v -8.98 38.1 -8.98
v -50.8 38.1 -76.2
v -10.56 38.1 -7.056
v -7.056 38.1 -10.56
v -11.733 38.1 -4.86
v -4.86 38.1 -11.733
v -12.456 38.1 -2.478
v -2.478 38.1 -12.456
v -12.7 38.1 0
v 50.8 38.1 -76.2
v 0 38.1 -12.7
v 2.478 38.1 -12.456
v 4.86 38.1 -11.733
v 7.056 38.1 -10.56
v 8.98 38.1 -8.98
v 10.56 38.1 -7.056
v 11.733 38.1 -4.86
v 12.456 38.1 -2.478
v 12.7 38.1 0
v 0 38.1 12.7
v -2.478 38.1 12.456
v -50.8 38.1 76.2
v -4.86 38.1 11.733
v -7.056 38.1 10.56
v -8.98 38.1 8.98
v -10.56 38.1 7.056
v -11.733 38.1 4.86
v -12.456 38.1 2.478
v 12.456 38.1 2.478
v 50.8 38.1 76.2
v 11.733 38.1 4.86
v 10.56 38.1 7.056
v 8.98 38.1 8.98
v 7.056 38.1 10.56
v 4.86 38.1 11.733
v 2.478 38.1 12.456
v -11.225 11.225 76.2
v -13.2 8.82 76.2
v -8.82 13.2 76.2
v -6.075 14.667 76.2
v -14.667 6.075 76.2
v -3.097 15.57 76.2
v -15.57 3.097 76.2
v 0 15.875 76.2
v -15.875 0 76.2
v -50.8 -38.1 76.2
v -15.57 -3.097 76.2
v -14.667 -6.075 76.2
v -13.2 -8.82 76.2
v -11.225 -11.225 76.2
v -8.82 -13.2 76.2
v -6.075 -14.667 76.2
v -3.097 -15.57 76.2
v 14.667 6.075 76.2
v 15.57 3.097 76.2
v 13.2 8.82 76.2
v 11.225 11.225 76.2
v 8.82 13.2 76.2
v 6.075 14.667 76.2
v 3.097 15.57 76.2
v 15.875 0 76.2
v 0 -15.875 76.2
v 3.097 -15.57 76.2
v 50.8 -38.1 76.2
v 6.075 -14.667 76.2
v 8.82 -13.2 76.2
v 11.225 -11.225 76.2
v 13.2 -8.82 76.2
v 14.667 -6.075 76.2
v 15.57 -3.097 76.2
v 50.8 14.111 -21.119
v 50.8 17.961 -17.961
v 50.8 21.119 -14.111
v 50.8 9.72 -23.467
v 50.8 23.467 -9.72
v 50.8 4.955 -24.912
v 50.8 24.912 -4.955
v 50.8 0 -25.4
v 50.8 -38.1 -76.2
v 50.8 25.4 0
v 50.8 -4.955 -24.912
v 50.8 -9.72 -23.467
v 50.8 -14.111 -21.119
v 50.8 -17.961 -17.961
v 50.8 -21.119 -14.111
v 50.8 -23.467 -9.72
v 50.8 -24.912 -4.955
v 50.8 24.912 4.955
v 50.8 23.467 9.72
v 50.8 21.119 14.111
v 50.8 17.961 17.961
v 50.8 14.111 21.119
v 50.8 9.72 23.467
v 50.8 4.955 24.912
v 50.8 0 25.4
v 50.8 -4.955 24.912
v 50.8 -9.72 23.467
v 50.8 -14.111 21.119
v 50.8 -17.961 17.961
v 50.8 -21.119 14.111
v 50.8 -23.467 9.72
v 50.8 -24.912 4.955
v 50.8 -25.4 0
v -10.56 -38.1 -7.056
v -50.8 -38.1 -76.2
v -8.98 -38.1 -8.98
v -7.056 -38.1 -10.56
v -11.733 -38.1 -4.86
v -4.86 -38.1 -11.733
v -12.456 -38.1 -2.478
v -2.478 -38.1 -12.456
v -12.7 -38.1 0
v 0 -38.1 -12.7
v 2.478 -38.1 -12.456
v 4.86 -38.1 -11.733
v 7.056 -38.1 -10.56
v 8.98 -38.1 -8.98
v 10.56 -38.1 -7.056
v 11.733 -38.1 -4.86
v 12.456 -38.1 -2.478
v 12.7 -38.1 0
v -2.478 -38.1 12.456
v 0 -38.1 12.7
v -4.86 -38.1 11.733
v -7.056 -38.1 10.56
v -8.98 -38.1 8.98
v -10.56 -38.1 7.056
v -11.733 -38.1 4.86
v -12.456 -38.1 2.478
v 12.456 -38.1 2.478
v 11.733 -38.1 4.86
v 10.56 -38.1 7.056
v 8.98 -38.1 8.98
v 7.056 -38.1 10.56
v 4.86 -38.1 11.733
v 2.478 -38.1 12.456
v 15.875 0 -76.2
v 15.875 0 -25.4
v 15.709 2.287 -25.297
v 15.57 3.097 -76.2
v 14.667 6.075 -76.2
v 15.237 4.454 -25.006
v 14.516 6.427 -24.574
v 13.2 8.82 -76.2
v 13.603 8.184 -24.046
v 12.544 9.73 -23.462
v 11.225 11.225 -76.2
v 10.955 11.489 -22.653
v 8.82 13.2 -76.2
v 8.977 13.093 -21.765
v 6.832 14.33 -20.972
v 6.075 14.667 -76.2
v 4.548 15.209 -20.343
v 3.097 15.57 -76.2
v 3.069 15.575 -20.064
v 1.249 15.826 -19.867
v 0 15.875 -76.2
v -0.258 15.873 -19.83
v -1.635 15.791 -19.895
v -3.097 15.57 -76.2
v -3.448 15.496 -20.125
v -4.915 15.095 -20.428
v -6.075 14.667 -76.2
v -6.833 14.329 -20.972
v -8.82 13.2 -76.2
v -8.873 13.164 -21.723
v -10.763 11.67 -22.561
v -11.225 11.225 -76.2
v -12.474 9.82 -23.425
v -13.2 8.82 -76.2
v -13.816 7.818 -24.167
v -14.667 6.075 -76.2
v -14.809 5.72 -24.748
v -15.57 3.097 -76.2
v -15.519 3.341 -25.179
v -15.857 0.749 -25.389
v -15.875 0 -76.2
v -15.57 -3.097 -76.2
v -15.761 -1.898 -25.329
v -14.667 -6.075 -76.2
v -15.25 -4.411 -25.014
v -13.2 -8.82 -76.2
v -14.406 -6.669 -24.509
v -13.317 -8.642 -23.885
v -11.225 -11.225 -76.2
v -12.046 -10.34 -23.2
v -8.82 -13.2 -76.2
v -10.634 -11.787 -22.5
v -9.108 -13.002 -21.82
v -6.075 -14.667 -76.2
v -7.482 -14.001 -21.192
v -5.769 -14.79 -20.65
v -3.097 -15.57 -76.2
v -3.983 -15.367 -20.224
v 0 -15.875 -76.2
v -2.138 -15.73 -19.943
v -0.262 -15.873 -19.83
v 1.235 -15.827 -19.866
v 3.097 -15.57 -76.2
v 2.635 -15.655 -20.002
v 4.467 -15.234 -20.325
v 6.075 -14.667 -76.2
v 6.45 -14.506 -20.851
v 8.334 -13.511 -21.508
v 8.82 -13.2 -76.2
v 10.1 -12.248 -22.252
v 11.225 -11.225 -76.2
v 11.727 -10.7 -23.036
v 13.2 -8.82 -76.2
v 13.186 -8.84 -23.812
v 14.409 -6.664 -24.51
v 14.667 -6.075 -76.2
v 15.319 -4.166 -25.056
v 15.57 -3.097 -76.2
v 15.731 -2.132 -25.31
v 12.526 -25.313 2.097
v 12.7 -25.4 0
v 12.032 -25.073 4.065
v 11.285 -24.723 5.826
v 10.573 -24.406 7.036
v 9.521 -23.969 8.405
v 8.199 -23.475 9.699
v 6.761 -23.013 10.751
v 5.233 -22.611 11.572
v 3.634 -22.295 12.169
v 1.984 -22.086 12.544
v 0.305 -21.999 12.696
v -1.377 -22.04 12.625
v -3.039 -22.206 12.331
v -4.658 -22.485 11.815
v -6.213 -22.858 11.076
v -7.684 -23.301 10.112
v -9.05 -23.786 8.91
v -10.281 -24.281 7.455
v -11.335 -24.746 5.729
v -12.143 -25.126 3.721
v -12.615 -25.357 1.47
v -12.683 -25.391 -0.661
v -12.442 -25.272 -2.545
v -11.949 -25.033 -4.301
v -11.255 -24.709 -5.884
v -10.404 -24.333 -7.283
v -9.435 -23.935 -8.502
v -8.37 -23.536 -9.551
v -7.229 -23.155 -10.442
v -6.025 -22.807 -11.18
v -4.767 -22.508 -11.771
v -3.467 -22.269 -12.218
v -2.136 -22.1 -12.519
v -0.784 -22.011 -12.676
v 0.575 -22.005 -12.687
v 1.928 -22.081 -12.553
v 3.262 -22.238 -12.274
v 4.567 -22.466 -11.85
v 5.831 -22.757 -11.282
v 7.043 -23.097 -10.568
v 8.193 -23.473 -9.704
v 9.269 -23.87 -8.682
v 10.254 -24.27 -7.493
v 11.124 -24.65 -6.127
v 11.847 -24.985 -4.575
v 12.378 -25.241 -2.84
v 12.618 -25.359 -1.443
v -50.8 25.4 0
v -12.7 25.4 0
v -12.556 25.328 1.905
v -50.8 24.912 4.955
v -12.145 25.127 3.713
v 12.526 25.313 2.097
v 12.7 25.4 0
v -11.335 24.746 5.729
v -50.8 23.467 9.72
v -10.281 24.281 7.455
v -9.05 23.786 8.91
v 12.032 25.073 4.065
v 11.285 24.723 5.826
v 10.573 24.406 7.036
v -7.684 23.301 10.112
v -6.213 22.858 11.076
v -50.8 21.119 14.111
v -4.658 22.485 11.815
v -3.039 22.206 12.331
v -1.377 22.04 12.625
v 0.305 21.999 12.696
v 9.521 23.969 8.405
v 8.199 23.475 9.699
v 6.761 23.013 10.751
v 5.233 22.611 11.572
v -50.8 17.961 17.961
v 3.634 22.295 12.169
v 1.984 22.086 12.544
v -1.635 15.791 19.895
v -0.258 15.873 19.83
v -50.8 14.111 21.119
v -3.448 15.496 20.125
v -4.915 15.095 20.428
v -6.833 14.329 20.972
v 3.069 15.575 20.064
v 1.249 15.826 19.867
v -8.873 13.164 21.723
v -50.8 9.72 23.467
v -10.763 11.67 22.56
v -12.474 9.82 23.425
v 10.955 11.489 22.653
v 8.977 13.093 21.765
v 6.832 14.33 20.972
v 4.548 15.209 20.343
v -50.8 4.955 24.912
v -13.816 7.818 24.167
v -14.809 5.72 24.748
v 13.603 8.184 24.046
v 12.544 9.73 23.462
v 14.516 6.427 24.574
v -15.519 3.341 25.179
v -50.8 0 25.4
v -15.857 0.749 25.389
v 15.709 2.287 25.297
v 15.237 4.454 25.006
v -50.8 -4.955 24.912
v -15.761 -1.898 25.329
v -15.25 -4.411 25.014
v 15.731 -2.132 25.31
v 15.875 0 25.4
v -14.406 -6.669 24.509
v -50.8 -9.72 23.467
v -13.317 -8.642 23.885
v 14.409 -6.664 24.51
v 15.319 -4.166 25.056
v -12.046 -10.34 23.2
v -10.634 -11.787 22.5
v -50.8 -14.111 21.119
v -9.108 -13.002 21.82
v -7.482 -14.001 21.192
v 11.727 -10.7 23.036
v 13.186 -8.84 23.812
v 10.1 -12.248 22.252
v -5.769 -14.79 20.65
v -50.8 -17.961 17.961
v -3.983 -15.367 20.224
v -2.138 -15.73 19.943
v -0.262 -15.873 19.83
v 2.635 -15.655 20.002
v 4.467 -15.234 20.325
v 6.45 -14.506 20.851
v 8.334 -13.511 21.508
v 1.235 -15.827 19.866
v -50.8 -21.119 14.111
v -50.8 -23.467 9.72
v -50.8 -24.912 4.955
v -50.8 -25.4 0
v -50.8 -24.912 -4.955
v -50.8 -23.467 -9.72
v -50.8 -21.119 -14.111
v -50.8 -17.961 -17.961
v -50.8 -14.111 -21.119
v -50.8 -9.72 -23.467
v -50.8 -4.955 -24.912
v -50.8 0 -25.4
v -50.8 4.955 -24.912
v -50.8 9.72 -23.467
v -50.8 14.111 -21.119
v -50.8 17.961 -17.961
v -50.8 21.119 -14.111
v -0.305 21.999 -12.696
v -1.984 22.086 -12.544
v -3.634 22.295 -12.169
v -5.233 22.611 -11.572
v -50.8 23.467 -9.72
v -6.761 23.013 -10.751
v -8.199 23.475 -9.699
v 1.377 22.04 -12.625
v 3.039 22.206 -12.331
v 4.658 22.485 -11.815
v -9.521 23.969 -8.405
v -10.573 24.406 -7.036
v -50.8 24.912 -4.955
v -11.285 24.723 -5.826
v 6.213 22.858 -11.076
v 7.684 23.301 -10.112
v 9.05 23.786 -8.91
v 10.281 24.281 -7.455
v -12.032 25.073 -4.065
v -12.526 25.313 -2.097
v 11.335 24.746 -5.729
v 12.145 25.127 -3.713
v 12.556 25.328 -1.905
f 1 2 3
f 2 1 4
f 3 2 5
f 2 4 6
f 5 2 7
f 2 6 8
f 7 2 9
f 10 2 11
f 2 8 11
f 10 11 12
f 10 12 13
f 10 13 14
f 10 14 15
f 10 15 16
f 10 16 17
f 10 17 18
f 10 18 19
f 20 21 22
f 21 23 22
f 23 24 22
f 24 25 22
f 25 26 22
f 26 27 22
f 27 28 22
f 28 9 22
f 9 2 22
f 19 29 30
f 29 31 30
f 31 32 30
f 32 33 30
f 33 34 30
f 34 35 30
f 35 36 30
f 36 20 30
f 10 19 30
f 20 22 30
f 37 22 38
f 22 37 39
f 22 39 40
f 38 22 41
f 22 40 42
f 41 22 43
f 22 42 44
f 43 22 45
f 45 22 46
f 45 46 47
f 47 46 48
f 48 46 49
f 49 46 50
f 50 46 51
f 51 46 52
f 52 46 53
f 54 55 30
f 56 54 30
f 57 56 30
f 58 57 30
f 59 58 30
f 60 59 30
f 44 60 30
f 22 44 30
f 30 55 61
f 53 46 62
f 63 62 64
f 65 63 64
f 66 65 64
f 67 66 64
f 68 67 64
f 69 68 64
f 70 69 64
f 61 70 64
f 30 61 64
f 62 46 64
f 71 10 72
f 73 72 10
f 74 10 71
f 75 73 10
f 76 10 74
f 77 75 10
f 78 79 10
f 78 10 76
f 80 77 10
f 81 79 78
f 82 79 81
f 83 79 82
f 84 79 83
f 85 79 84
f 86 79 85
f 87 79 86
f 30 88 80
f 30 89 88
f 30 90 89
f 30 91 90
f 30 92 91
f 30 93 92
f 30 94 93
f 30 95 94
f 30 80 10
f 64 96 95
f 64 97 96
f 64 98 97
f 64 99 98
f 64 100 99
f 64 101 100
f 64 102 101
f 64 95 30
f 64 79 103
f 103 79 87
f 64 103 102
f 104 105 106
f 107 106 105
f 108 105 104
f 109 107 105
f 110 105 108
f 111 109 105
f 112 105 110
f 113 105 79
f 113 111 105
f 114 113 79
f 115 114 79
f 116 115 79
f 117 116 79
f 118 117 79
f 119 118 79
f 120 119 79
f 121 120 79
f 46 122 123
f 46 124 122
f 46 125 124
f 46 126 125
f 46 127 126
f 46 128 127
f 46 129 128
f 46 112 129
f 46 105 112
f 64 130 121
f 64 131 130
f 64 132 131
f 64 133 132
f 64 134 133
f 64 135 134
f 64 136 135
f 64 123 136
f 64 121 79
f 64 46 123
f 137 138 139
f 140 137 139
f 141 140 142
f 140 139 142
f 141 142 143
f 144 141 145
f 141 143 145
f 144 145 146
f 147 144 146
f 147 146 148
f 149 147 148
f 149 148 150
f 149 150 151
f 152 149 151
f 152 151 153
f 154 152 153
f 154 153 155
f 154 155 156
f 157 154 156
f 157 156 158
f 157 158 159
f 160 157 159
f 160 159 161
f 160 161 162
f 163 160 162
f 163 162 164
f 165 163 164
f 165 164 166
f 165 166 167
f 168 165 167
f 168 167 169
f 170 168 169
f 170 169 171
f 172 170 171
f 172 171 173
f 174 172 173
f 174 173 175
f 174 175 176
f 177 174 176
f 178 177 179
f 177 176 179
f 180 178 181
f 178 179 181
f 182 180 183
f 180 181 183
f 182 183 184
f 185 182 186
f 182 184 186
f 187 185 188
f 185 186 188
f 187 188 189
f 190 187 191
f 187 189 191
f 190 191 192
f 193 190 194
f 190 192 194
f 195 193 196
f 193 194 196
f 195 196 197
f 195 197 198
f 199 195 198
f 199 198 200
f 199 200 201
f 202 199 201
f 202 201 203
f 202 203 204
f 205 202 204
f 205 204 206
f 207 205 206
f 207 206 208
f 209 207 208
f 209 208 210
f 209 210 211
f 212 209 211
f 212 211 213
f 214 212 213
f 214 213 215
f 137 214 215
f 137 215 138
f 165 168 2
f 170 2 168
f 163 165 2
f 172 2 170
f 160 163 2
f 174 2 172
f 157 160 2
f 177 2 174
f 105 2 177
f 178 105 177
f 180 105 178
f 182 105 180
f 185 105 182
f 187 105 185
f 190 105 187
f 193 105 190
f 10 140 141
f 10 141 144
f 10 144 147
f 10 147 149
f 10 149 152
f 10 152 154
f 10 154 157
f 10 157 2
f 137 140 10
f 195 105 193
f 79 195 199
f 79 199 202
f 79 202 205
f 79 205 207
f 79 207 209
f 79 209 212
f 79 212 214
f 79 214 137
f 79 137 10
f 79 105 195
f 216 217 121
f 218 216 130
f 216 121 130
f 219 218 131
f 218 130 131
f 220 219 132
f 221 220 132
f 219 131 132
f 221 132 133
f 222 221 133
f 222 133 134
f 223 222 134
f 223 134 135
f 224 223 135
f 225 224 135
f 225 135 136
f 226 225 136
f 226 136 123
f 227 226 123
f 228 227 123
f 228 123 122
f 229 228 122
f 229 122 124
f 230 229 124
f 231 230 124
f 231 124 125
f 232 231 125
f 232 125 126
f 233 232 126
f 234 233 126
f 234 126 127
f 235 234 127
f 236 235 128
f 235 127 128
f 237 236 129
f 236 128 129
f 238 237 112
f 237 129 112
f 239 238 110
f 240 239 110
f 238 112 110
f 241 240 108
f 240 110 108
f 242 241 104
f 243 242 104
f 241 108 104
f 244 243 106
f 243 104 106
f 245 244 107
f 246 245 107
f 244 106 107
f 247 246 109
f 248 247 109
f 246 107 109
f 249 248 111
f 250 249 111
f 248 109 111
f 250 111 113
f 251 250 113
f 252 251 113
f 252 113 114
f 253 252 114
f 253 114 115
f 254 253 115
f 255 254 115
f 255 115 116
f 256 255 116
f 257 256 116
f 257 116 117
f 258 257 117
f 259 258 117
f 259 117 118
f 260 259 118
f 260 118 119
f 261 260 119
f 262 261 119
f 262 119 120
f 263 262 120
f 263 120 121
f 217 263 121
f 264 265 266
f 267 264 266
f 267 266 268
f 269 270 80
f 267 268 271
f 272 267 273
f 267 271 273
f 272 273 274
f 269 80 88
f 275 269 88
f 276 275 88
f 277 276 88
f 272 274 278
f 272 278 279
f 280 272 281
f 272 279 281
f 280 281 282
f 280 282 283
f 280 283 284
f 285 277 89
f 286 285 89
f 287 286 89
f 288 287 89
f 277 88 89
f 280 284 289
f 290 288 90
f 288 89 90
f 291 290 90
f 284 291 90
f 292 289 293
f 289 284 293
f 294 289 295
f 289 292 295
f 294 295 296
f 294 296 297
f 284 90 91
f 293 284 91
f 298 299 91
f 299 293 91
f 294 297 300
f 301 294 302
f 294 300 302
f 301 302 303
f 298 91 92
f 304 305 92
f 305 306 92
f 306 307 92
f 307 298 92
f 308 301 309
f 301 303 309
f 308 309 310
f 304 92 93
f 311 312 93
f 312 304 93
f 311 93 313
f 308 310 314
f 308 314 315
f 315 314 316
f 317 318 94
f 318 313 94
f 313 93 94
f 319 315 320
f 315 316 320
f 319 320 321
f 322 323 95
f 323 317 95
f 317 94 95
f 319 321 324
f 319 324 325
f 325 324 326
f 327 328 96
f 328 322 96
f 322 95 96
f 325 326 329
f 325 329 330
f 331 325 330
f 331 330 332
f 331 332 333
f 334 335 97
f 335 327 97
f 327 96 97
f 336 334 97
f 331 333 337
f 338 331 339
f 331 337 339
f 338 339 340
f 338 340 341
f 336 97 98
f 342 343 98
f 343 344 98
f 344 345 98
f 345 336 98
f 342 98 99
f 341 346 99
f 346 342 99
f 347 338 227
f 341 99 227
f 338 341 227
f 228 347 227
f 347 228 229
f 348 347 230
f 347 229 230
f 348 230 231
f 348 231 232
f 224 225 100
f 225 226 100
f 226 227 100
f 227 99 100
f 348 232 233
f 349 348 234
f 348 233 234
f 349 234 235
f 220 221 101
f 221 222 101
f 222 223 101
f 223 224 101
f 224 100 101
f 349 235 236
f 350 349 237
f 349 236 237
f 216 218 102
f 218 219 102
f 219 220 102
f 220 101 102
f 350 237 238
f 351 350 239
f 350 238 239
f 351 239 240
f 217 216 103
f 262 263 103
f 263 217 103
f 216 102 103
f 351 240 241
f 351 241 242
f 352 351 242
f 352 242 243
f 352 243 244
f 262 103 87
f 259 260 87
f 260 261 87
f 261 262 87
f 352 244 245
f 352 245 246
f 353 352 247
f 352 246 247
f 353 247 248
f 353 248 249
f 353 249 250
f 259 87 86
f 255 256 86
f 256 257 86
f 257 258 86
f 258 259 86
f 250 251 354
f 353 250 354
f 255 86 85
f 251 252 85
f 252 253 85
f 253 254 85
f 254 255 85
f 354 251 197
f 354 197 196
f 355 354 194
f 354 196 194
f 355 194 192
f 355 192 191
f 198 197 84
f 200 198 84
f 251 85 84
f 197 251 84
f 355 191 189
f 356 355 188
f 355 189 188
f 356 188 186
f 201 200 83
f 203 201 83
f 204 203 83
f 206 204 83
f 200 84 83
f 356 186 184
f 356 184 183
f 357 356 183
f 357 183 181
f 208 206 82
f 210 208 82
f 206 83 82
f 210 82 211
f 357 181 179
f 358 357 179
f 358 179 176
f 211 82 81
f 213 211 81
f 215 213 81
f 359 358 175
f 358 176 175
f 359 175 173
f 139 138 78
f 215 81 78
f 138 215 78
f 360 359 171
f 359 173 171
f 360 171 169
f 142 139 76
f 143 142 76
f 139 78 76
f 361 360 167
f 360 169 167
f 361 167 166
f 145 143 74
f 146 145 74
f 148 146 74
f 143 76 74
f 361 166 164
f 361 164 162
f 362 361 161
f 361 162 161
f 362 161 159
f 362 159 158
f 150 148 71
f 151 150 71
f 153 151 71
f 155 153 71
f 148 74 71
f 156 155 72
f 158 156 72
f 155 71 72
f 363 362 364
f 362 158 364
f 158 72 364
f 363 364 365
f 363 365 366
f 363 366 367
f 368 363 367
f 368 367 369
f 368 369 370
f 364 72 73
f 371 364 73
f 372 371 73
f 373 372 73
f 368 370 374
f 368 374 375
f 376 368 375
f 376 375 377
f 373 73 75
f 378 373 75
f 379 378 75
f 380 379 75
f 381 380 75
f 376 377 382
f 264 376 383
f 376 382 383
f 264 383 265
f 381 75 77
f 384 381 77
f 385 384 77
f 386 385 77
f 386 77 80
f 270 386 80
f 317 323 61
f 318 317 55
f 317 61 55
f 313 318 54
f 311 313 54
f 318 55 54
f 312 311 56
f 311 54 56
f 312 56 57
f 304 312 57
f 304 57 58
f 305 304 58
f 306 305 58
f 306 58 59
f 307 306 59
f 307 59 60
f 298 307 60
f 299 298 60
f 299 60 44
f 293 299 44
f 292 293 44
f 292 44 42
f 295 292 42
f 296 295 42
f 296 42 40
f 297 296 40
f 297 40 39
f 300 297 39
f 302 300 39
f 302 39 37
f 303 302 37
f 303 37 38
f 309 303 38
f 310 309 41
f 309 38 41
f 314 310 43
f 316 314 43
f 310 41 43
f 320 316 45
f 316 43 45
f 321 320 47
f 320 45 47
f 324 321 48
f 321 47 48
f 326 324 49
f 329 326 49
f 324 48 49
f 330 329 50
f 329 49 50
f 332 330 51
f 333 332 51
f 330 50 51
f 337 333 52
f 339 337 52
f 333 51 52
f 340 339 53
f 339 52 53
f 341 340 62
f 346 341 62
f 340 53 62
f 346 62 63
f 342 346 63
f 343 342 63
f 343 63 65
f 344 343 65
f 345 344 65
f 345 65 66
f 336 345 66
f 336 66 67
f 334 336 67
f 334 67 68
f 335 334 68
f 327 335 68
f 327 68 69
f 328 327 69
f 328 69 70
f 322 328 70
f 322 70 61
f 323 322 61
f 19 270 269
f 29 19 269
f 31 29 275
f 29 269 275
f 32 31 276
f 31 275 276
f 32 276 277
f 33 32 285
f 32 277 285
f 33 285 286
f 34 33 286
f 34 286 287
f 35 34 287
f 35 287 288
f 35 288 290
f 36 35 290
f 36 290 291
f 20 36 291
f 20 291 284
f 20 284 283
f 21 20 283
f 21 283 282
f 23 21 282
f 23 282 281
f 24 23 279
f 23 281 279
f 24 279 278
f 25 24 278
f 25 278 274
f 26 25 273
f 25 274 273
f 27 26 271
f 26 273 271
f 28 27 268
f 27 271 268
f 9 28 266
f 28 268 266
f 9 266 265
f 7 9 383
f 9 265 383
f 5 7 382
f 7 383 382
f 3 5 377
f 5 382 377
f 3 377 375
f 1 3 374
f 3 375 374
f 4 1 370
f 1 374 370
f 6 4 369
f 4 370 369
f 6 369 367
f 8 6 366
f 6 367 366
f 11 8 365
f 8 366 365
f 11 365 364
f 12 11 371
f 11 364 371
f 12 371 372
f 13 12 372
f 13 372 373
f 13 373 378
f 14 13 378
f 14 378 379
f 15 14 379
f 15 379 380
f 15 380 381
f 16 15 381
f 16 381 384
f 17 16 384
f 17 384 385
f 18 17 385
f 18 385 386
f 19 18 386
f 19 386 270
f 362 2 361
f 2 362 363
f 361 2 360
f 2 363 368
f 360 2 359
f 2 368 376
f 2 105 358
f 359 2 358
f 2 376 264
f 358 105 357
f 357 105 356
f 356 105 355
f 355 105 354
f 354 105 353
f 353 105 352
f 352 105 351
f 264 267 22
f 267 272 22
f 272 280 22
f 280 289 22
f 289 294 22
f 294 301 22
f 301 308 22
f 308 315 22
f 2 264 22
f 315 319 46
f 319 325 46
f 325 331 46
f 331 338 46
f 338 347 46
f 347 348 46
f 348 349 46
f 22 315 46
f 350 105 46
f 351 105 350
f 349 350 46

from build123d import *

# Parameters (mm, degrees)
F0_W     = 101.6
F0_H     = 152.4
F1_DEPTH = 38.1
F2_R     = 12.7
F3_DEPTH = 76.201
F4_R     = 25.4
F5_DEPTH = 101.601
F6_R     = 15.875
F7_DEPTH = 152.401


with BuildPart() as f1:
    # F0 (on Front) → F1 (new body, symmetric)
    with BuildSketch(Plane.XZ):
        Rectangle(F0_W, F0_H)
    extrude(amount=F1_DEPTH, both=True)

    # F2 (on face) → F3 (cut, through all)
    with BuildSketch(Plane.XZ.offset(38.1)):
        Circle(F2_R)
    extrude(amount=-F3_DEPTH, mode=Mode.SUBTRACT)

    # F4 (on face) → F5 (cut, through all)
    with BuildSketch(Plane.YZ.offset(50.8)):
        Circle(F4_R)
    extrude(amount=-F5_DEPTH, mode=Mode.SUBTRACT)

    # F6 (on face) → F7 (cut, through all)
    with BuildSketch(Plane.XY.offset(76.2)):
        Circle(F6_R)
    extrude(amount=-F7_DEPTH, mode=Mode.SUBTRACT)


solid = f1.part
